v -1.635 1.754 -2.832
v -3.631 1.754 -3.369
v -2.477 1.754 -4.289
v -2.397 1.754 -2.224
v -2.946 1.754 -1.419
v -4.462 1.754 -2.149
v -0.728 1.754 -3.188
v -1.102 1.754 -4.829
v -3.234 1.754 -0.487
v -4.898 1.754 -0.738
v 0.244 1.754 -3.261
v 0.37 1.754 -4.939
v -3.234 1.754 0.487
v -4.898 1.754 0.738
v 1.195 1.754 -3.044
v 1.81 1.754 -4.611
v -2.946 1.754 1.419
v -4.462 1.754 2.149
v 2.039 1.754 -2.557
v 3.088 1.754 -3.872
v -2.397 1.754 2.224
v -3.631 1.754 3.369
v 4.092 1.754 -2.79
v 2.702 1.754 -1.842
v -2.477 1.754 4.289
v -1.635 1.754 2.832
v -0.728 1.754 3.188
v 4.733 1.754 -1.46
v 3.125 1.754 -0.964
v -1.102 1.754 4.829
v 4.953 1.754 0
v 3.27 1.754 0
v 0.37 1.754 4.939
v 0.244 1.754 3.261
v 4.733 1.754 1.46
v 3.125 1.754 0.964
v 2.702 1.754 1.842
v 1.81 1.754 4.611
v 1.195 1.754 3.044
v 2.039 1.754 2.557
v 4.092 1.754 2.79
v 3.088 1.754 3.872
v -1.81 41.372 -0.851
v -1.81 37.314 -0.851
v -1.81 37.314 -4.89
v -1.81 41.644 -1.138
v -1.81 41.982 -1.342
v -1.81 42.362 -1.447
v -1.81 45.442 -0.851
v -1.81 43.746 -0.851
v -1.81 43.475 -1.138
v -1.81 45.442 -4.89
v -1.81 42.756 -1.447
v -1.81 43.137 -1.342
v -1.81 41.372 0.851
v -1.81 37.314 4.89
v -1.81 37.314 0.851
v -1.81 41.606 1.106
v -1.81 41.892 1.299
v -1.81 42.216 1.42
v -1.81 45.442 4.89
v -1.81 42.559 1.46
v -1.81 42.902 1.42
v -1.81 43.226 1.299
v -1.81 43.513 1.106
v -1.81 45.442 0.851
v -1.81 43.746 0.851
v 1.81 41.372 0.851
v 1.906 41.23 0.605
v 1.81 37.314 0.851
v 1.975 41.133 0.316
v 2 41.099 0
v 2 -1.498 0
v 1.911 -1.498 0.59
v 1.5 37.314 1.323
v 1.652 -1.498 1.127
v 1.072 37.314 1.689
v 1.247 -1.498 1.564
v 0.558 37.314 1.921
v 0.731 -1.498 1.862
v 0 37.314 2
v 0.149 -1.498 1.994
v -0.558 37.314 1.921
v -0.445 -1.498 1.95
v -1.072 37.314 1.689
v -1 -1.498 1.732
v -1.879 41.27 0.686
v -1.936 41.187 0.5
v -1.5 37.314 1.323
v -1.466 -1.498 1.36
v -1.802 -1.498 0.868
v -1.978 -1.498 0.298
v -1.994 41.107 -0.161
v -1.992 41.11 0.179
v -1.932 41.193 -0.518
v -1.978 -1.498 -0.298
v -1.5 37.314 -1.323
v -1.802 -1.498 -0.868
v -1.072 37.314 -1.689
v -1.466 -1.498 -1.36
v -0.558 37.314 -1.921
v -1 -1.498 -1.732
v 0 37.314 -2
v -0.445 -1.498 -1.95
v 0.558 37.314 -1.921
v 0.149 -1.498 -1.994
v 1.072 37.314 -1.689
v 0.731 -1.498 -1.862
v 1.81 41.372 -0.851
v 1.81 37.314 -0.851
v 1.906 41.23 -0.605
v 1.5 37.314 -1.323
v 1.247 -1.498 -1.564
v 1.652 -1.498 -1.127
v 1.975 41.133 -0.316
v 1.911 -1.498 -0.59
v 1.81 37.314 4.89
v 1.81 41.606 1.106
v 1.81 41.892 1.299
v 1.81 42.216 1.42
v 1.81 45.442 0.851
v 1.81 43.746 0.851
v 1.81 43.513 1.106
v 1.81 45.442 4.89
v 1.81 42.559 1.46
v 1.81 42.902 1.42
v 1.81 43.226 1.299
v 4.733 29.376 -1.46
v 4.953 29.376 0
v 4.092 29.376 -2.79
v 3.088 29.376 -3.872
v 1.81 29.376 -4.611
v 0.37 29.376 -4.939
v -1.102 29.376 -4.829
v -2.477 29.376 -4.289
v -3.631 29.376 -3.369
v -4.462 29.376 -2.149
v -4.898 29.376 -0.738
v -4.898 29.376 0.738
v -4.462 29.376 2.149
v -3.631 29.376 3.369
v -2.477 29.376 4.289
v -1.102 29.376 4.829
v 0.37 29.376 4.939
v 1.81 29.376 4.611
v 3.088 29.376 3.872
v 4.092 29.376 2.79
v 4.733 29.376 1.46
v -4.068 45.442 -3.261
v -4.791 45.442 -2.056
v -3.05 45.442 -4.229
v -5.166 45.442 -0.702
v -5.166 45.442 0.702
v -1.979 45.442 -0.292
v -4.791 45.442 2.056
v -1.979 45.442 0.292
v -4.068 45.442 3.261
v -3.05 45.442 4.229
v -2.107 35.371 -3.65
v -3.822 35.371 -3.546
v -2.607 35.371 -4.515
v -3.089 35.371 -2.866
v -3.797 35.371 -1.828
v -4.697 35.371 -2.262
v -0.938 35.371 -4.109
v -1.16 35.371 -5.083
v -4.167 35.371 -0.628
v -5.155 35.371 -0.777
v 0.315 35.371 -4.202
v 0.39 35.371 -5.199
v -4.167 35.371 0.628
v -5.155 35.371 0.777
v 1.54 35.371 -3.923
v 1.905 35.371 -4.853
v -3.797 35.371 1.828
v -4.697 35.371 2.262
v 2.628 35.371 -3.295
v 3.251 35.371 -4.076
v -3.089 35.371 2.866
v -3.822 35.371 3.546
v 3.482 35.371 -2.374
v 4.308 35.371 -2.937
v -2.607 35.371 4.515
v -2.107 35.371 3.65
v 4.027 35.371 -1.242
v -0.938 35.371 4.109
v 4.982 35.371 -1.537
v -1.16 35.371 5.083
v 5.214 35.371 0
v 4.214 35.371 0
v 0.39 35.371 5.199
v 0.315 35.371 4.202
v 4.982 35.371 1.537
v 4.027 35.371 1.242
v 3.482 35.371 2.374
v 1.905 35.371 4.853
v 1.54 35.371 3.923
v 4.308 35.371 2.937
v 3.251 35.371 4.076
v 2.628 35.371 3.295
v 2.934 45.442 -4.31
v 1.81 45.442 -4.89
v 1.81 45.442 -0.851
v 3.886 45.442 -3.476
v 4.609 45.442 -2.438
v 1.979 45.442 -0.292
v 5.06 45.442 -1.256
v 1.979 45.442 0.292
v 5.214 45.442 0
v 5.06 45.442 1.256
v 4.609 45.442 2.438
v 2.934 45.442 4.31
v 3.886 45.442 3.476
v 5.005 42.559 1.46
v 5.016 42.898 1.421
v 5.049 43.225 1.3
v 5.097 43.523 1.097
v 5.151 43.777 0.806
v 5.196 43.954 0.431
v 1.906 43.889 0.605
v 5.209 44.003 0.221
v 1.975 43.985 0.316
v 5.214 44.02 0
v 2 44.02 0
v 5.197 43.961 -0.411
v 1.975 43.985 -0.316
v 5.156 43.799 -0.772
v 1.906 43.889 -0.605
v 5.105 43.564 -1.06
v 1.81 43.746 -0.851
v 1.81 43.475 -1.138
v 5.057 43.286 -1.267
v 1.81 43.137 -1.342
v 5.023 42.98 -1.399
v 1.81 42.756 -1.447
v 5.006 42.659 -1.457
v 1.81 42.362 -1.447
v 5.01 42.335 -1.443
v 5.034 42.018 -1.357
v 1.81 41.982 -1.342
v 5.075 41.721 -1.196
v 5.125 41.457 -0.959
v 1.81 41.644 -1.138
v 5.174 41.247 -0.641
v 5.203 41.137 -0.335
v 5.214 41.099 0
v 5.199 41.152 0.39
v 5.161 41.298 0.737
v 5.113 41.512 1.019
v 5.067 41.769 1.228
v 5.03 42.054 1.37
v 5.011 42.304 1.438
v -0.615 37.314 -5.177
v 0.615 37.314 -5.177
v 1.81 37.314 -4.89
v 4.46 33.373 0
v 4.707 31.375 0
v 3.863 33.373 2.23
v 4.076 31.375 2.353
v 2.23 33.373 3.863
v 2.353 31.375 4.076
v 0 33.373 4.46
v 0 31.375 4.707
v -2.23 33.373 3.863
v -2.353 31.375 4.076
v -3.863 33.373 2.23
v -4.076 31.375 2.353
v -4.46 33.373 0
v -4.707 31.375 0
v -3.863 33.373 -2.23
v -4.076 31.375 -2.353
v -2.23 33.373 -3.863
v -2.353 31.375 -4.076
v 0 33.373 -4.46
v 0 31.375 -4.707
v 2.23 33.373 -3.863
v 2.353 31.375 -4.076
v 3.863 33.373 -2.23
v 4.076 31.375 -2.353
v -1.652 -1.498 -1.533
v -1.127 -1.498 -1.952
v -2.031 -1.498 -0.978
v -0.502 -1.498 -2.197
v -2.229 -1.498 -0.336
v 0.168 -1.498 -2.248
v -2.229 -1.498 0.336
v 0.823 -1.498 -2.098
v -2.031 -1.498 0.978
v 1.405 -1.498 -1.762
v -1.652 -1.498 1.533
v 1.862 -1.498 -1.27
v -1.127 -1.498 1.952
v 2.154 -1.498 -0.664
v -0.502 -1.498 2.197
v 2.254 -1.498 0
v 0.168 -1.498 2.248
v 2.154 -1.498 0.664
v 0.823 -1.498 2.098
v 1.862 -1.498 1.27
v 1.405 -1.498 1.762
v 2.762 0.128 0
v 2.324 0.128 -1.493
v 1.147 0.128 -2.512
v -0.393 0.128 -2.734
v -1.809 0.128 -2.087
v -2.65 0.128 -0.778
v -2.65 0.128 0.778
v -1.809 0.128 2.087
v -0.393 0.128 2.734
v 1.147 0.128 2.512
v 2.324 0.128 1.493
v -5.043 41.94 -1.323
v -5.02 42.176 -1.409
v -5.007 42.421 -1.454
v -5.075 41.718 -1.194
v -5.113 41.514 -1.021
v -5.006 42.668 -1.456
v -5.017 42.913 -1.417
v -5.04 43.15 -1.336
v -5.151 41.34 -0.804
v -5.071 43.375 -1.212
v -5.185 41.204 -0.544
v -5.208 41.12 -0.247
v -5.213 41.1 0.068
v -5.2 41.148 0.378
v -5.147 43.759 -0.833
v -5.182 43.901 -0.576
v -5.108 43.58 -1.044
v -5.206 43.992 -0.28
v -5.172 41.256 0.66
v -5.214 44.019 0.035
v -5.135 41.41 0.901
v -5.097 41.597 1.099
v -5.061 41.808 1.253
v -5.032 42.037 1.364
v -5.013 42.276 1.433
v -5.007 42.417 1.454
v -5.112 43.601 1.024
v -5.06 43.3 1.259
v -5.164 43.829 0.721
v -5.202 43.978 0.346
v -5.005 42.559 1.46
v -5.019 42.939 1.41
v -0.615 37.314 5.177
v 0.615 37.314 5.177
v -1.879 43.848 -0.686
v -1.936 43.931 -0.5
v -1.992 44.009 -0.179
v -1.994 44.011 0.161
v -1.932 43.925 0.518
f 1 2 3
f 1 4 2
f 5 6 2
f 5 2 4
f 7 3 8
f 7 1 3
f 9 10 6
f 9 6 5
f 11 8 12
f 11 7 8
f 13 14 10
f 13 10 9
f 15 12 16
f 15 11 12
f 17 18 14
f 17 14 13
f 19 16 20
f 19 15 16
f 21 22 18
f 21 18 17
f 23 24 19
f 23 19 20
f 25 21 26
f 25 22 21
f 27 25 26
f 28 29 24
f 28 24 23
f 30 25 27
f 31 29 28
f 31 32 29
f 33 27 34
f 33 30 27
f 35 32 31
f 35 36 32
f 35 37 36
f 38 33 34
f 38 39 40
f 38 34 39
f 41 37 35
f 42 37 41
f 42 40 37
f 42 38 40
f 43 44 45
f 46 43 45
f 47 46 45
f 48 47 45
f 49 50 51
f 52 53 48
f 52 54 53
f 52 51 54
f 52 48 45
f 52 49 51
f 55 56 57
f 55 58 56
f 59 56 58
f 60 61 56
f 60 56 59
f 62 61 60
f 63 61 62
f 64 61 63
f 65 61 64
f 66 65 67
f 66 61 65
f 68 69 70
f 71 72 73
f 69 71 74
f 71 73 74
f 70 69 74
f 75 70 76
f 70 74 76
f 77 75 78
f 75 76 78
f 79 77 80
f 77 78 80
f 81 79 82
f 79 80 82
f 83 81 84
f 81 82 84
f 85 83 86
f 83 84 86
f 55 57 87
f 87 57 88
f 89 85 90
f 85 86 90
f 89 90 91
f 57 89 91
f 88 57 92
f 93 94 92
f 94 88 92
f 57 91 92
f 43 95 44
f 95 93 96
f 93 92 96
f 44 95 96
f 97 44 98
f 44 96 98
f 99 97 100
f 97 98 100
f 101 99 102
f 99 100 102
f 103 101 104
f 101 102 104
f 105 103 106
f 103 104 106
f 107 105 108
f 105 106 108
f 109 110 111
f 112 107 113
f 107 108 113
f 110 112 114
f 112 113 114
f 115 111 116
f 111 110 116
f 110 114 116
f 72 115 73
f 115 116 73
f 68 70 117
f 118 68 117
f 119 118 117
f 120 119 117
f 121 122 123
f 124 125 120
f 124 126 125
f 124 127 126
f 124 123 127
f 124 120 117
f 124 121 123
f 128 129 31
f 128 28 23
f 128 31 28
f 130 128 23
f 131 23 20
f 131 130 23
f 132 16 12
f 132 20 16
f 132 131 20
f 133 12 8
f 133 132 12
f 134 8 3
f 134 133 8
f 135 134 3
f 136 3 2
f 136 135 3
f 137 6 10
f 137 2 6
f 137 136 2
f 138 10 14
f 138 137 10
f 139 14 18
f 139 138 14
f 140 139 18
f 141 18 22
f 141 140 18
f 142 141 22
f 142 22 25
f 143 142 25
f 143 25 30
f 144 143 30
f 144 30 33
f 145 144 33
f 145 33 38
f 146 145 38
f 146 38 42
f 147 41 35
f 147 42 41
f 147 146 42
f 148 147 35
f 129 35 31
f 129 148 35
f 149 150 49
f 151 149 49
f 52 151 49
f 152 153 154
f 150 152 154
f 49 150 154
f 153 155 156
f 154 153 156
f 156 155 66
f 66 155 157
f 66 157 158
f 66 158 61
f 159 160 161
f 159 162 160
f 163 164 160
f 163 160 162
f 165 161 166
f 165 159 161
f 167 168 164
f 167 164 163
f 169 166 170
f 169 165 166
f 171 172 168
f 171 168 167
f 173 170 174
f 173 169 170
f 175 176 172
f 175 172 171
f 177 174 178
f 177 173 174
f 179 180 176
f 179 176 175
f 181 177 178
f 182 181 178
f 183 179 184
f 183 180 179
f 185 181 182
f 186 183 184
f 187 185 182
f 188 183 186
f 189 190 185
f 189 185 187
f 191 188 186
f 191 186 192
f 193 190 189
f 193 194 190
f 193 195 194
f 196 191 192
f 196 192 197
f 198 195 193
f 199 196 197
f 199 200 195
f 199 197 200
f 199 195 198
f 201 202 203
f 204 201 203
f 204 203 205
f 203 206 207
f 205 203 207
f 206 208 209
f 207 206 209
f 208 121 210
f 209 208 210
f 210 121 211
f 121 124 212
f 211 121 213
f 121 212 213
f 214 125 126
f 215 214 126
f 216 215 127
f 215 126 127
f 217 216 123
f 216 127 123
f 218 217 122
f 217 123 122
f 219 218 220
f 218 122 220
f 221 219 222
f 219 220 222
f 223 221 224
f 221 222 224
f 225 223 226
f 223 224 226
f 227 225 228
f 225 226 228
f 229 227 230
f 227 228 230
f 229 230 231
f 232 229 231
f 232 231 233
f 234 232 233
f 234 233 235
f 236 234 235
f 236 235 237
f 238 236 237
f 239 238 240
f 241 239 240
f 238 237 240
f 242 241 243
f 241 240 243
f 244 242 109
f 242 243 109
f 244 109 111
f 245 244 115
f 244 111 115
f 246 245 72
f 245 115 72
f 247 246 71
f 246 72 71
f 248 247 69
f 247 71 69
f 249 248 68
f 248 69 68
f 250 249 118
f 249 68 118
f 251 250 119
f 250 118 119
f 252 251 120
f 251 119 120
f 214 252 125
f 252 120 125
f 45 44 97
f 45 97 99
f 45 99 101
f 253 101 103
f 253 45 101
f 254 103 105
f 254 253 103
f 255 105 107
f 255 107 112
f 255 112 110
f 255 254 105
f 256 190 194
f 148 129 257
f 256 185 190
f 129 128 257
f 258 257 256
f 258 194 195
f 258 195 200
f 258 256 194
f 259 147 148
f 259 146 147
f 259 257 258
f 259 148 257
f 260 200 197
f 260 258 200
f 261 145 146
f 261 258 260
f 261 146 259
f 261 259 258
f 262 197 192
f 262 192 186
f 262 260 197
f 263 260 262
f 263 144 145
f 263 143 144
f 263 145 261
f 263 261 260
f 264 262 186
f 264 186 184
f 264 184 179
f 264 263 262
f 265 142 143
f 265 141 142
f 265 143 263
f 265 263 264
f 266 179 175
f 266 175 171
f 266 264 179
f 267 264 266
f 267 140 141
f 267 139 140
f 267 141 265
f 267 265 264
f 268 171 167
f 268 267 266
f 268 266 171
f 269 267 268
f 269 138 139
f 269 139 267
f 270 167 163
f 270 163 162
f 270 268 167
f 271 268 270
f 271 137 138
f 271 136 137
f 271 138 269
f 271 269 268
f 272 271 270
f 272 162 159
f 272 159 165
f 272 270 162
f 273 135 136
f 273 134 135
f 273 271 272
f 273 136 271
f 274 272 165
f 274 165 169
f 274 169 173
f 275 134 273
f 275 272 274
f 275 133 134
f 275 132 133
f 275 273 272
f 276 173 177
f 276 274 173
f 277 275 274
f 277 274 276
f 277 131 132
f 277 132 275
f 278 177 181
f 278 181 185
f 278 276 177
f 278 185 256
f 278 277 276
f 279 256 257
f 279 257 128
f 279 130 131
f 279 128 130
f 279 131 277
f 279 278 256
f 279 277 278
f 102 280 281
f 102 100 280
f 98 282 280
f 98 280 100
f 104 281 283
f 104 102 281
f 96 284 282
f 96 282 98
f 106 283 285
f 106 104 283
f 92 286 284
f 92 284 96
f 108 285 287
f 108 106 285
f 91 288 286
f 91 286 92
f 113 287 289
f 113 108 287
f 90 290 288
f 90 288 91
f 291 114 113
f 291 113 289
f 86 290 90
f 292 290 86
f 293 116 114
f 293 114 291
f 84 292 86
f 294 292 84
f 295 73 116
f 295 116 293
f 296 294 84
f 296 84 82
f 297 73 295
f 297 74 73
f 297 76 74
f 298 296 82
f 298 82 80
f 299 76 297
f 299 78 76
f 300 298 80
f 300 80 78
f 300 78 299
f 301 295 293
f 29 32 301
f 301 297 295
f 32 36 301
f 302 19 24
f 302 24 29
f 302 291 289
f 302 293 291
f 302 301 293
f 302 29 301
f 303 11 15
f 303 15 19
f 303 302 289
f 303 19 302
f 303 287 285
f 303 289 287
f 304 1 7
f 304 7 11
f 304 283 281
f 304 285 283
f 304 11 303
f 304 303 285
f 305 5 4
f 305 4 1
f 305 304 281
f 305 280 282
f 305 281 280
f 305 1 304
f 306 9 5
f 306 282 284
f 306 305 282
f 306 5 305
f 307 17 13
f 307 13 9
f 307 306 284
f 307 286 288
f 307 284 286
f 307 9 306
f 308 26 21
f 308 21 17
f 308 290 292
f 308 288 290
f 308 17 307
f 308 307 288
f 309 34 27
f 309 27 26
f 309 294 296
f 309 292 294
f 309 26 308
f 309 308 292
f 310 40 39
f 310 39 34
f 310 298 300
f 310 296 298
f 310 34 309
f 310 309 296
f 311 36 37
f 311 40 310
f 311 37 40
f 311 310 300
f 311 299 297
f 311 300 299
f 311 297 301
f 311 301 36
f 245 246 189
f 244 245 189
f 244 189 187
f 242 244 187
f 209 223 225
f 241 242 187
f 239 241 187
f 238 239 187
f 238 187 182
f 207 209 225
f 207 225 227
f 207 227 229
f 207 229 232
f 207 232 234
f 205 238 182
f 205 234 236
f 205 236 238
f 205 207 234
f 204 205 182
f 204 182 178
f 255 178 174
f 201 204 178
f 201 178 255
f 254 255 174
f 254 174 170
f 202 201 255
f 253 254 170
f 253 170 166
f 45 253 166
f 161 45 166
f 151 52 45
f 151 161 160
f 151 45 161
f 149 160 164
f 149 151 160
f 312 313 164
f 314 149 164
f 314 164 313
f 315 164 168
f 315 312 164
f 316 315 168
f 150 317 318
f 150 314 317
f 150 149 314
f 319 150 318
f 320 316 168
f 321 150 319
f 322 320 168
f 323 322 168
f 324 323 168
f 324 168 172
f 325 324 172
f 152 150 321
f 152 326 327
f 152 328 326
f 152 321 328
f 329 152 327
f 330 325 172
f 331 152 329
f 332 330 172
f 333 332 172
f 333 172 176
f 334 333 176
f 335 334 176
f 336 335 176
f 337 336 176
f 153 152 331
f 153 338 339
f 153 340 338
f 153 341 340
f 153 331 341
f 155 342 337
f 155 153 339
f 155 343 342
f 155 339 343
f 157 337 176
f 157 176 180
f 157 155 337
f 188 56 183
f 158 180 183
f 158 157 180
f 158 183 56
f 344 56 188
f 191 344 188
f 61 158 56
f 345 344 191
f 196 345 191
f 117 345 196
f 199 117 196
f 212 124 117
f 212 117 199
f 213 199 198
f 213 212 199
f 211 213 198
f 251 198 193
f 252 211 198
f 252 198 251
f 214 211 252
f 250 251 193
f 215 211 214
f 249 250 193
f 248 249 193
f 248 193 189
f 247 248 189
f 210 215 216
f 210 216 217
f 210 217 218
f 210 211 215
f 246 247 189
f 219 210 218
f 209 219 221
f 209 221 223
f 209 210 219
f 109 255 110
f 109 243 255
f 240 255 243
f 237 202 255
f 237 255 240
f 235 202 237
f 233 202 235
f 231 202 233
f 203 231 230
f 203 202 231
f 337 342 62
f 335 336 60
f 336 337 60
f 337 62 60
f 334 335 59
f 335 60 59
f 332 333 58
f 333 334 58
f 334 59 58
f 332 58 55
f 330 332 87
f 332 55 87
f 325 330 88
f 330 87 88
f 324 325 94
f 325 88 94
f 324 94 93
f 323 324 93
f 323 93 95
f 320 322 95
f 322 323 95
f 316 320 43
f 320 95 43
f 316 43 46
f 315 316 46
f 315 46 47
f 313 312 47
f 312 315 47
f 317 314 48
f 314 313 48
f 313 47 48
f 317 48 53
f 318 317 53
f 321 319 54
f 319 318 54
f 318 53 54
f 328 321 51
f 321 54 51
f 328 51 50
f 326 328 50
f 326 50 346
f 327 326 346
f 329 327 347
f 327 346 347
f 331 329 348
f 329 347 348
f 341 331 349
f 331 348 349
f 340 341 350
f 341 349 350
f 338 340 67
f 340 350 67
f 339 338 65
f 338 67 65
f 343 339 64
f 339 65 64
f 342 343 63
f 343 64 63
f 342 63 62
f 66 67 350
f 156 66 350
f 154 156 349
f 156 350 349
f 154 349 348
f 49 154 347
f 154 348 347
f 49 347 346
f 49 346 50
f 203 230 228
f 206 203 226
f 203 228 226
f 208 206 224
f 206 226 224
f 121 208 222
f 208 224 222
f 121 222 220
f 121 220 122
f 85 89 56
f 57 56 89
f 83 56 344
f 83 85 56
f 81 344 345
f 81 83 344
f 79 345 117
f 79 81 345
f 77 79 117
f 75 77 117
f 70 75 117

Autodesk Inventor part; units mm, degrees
ref_plane "YZ Plane" through (0, 0, 0) normal (1, 0, 0) x (0, 1, 0)
ref_plane "XZ Plane" through (0, 0, 0) normal (0, 1, 0) x (-1, 0, 0)
ref_plane "XY Plane" through (0, 0, 0) normal (0, 0, 1) x (1, 0, 0)
sketch "Sketch1" plane through (0, 0, 0) normal (0, 0, 1) x (1, 0, 0)
  line L0 (2, 45.442) -> (2, -1.498)
  line L1 (2.254, -1.498) -> (3.2702, 1.754)
  line L2 (3.2702, 1.754) -> (4.953, 1.754)
  line L3 (4.953, 1.754) -> (4.953, 29.3765)
  line L4 (4.953, 29.3765) -> (4.2142, 35.3709)
  line L5 (4.2142, 35.3709) -> (5.2137, 35.3709)
  line L6 (5.2137, 35.3709) -> (5.2137, 45.442)
  line L7 (5.2137, 45.442) -> (2, 45.442)
  line L8 (0, 63.454) -> (0, -29.2362) construction
  line L9 (2.7221, 0) -> (1.4605, -4.0372) construction
  line L10 (1.4605, -4.0372) -> (0, -4.0372) construction
  line L11 (2.254, -1.498) -> (2, -1.498)
  point P0 (0, 0)
  dimension "d0" = 2
  dimension "d1" = 4.953
  dimension "d2" = 3.2702
  dimension "d3" = 43.688
  dimension "d4" = 10.0711
  dimension "d5" = 5.9944
  dimension "d16" = 1.4605
  dimension "d17" = 5.7912
  dimension "d18" = 0.254
revolve "Revolution1" add sketch "Sketch1" angle 360 about axis through (0, 63.454, 0) along (0, -1, 0)
sketch "Sketch2" plane through (0, 45.442, 0) normal (0, 1, 0) x (1, 0, 0)
  line L0 (-1.8097, 6.35) -> (1.8097, 6.35)
  line L1 (1.8097, 6.35) -> (1.8097, -6.35)
  line L2 (1.8097, -6.35) -> (-1.8097, -6.35)
  line L3 (-1.8097, -6.35) -> (-1.8097, 6.35)
  point P0 (0, 0)
  point P1 (0, -6.35)
  point P2 (1.8097, 0)
  dimension "d8" = 3.6195
  dimension "d9" = 12.7
extrude "Extrusion1" cut sketch "Sketch2" against normal blind 8.128
sketch "Sketch3" plane through (1.8097, 45.442, 0.8514) normal (-1, 0, 0) x (0, 0, 1)
  circle A0 centre (-0.8514, -2.8829) radius 1.4605
  line L0 (0, 0) -> (4.0382, 0) projected
  point P0 (-0.8514, -45.442)
  dimension "d12" = 2.921
  dimension "d13" = 2.8829
extrude "Extrusion2" cut sketch "Sketch3" along normal through all both and the other way through all
properties part number "SolenoidShaft"
